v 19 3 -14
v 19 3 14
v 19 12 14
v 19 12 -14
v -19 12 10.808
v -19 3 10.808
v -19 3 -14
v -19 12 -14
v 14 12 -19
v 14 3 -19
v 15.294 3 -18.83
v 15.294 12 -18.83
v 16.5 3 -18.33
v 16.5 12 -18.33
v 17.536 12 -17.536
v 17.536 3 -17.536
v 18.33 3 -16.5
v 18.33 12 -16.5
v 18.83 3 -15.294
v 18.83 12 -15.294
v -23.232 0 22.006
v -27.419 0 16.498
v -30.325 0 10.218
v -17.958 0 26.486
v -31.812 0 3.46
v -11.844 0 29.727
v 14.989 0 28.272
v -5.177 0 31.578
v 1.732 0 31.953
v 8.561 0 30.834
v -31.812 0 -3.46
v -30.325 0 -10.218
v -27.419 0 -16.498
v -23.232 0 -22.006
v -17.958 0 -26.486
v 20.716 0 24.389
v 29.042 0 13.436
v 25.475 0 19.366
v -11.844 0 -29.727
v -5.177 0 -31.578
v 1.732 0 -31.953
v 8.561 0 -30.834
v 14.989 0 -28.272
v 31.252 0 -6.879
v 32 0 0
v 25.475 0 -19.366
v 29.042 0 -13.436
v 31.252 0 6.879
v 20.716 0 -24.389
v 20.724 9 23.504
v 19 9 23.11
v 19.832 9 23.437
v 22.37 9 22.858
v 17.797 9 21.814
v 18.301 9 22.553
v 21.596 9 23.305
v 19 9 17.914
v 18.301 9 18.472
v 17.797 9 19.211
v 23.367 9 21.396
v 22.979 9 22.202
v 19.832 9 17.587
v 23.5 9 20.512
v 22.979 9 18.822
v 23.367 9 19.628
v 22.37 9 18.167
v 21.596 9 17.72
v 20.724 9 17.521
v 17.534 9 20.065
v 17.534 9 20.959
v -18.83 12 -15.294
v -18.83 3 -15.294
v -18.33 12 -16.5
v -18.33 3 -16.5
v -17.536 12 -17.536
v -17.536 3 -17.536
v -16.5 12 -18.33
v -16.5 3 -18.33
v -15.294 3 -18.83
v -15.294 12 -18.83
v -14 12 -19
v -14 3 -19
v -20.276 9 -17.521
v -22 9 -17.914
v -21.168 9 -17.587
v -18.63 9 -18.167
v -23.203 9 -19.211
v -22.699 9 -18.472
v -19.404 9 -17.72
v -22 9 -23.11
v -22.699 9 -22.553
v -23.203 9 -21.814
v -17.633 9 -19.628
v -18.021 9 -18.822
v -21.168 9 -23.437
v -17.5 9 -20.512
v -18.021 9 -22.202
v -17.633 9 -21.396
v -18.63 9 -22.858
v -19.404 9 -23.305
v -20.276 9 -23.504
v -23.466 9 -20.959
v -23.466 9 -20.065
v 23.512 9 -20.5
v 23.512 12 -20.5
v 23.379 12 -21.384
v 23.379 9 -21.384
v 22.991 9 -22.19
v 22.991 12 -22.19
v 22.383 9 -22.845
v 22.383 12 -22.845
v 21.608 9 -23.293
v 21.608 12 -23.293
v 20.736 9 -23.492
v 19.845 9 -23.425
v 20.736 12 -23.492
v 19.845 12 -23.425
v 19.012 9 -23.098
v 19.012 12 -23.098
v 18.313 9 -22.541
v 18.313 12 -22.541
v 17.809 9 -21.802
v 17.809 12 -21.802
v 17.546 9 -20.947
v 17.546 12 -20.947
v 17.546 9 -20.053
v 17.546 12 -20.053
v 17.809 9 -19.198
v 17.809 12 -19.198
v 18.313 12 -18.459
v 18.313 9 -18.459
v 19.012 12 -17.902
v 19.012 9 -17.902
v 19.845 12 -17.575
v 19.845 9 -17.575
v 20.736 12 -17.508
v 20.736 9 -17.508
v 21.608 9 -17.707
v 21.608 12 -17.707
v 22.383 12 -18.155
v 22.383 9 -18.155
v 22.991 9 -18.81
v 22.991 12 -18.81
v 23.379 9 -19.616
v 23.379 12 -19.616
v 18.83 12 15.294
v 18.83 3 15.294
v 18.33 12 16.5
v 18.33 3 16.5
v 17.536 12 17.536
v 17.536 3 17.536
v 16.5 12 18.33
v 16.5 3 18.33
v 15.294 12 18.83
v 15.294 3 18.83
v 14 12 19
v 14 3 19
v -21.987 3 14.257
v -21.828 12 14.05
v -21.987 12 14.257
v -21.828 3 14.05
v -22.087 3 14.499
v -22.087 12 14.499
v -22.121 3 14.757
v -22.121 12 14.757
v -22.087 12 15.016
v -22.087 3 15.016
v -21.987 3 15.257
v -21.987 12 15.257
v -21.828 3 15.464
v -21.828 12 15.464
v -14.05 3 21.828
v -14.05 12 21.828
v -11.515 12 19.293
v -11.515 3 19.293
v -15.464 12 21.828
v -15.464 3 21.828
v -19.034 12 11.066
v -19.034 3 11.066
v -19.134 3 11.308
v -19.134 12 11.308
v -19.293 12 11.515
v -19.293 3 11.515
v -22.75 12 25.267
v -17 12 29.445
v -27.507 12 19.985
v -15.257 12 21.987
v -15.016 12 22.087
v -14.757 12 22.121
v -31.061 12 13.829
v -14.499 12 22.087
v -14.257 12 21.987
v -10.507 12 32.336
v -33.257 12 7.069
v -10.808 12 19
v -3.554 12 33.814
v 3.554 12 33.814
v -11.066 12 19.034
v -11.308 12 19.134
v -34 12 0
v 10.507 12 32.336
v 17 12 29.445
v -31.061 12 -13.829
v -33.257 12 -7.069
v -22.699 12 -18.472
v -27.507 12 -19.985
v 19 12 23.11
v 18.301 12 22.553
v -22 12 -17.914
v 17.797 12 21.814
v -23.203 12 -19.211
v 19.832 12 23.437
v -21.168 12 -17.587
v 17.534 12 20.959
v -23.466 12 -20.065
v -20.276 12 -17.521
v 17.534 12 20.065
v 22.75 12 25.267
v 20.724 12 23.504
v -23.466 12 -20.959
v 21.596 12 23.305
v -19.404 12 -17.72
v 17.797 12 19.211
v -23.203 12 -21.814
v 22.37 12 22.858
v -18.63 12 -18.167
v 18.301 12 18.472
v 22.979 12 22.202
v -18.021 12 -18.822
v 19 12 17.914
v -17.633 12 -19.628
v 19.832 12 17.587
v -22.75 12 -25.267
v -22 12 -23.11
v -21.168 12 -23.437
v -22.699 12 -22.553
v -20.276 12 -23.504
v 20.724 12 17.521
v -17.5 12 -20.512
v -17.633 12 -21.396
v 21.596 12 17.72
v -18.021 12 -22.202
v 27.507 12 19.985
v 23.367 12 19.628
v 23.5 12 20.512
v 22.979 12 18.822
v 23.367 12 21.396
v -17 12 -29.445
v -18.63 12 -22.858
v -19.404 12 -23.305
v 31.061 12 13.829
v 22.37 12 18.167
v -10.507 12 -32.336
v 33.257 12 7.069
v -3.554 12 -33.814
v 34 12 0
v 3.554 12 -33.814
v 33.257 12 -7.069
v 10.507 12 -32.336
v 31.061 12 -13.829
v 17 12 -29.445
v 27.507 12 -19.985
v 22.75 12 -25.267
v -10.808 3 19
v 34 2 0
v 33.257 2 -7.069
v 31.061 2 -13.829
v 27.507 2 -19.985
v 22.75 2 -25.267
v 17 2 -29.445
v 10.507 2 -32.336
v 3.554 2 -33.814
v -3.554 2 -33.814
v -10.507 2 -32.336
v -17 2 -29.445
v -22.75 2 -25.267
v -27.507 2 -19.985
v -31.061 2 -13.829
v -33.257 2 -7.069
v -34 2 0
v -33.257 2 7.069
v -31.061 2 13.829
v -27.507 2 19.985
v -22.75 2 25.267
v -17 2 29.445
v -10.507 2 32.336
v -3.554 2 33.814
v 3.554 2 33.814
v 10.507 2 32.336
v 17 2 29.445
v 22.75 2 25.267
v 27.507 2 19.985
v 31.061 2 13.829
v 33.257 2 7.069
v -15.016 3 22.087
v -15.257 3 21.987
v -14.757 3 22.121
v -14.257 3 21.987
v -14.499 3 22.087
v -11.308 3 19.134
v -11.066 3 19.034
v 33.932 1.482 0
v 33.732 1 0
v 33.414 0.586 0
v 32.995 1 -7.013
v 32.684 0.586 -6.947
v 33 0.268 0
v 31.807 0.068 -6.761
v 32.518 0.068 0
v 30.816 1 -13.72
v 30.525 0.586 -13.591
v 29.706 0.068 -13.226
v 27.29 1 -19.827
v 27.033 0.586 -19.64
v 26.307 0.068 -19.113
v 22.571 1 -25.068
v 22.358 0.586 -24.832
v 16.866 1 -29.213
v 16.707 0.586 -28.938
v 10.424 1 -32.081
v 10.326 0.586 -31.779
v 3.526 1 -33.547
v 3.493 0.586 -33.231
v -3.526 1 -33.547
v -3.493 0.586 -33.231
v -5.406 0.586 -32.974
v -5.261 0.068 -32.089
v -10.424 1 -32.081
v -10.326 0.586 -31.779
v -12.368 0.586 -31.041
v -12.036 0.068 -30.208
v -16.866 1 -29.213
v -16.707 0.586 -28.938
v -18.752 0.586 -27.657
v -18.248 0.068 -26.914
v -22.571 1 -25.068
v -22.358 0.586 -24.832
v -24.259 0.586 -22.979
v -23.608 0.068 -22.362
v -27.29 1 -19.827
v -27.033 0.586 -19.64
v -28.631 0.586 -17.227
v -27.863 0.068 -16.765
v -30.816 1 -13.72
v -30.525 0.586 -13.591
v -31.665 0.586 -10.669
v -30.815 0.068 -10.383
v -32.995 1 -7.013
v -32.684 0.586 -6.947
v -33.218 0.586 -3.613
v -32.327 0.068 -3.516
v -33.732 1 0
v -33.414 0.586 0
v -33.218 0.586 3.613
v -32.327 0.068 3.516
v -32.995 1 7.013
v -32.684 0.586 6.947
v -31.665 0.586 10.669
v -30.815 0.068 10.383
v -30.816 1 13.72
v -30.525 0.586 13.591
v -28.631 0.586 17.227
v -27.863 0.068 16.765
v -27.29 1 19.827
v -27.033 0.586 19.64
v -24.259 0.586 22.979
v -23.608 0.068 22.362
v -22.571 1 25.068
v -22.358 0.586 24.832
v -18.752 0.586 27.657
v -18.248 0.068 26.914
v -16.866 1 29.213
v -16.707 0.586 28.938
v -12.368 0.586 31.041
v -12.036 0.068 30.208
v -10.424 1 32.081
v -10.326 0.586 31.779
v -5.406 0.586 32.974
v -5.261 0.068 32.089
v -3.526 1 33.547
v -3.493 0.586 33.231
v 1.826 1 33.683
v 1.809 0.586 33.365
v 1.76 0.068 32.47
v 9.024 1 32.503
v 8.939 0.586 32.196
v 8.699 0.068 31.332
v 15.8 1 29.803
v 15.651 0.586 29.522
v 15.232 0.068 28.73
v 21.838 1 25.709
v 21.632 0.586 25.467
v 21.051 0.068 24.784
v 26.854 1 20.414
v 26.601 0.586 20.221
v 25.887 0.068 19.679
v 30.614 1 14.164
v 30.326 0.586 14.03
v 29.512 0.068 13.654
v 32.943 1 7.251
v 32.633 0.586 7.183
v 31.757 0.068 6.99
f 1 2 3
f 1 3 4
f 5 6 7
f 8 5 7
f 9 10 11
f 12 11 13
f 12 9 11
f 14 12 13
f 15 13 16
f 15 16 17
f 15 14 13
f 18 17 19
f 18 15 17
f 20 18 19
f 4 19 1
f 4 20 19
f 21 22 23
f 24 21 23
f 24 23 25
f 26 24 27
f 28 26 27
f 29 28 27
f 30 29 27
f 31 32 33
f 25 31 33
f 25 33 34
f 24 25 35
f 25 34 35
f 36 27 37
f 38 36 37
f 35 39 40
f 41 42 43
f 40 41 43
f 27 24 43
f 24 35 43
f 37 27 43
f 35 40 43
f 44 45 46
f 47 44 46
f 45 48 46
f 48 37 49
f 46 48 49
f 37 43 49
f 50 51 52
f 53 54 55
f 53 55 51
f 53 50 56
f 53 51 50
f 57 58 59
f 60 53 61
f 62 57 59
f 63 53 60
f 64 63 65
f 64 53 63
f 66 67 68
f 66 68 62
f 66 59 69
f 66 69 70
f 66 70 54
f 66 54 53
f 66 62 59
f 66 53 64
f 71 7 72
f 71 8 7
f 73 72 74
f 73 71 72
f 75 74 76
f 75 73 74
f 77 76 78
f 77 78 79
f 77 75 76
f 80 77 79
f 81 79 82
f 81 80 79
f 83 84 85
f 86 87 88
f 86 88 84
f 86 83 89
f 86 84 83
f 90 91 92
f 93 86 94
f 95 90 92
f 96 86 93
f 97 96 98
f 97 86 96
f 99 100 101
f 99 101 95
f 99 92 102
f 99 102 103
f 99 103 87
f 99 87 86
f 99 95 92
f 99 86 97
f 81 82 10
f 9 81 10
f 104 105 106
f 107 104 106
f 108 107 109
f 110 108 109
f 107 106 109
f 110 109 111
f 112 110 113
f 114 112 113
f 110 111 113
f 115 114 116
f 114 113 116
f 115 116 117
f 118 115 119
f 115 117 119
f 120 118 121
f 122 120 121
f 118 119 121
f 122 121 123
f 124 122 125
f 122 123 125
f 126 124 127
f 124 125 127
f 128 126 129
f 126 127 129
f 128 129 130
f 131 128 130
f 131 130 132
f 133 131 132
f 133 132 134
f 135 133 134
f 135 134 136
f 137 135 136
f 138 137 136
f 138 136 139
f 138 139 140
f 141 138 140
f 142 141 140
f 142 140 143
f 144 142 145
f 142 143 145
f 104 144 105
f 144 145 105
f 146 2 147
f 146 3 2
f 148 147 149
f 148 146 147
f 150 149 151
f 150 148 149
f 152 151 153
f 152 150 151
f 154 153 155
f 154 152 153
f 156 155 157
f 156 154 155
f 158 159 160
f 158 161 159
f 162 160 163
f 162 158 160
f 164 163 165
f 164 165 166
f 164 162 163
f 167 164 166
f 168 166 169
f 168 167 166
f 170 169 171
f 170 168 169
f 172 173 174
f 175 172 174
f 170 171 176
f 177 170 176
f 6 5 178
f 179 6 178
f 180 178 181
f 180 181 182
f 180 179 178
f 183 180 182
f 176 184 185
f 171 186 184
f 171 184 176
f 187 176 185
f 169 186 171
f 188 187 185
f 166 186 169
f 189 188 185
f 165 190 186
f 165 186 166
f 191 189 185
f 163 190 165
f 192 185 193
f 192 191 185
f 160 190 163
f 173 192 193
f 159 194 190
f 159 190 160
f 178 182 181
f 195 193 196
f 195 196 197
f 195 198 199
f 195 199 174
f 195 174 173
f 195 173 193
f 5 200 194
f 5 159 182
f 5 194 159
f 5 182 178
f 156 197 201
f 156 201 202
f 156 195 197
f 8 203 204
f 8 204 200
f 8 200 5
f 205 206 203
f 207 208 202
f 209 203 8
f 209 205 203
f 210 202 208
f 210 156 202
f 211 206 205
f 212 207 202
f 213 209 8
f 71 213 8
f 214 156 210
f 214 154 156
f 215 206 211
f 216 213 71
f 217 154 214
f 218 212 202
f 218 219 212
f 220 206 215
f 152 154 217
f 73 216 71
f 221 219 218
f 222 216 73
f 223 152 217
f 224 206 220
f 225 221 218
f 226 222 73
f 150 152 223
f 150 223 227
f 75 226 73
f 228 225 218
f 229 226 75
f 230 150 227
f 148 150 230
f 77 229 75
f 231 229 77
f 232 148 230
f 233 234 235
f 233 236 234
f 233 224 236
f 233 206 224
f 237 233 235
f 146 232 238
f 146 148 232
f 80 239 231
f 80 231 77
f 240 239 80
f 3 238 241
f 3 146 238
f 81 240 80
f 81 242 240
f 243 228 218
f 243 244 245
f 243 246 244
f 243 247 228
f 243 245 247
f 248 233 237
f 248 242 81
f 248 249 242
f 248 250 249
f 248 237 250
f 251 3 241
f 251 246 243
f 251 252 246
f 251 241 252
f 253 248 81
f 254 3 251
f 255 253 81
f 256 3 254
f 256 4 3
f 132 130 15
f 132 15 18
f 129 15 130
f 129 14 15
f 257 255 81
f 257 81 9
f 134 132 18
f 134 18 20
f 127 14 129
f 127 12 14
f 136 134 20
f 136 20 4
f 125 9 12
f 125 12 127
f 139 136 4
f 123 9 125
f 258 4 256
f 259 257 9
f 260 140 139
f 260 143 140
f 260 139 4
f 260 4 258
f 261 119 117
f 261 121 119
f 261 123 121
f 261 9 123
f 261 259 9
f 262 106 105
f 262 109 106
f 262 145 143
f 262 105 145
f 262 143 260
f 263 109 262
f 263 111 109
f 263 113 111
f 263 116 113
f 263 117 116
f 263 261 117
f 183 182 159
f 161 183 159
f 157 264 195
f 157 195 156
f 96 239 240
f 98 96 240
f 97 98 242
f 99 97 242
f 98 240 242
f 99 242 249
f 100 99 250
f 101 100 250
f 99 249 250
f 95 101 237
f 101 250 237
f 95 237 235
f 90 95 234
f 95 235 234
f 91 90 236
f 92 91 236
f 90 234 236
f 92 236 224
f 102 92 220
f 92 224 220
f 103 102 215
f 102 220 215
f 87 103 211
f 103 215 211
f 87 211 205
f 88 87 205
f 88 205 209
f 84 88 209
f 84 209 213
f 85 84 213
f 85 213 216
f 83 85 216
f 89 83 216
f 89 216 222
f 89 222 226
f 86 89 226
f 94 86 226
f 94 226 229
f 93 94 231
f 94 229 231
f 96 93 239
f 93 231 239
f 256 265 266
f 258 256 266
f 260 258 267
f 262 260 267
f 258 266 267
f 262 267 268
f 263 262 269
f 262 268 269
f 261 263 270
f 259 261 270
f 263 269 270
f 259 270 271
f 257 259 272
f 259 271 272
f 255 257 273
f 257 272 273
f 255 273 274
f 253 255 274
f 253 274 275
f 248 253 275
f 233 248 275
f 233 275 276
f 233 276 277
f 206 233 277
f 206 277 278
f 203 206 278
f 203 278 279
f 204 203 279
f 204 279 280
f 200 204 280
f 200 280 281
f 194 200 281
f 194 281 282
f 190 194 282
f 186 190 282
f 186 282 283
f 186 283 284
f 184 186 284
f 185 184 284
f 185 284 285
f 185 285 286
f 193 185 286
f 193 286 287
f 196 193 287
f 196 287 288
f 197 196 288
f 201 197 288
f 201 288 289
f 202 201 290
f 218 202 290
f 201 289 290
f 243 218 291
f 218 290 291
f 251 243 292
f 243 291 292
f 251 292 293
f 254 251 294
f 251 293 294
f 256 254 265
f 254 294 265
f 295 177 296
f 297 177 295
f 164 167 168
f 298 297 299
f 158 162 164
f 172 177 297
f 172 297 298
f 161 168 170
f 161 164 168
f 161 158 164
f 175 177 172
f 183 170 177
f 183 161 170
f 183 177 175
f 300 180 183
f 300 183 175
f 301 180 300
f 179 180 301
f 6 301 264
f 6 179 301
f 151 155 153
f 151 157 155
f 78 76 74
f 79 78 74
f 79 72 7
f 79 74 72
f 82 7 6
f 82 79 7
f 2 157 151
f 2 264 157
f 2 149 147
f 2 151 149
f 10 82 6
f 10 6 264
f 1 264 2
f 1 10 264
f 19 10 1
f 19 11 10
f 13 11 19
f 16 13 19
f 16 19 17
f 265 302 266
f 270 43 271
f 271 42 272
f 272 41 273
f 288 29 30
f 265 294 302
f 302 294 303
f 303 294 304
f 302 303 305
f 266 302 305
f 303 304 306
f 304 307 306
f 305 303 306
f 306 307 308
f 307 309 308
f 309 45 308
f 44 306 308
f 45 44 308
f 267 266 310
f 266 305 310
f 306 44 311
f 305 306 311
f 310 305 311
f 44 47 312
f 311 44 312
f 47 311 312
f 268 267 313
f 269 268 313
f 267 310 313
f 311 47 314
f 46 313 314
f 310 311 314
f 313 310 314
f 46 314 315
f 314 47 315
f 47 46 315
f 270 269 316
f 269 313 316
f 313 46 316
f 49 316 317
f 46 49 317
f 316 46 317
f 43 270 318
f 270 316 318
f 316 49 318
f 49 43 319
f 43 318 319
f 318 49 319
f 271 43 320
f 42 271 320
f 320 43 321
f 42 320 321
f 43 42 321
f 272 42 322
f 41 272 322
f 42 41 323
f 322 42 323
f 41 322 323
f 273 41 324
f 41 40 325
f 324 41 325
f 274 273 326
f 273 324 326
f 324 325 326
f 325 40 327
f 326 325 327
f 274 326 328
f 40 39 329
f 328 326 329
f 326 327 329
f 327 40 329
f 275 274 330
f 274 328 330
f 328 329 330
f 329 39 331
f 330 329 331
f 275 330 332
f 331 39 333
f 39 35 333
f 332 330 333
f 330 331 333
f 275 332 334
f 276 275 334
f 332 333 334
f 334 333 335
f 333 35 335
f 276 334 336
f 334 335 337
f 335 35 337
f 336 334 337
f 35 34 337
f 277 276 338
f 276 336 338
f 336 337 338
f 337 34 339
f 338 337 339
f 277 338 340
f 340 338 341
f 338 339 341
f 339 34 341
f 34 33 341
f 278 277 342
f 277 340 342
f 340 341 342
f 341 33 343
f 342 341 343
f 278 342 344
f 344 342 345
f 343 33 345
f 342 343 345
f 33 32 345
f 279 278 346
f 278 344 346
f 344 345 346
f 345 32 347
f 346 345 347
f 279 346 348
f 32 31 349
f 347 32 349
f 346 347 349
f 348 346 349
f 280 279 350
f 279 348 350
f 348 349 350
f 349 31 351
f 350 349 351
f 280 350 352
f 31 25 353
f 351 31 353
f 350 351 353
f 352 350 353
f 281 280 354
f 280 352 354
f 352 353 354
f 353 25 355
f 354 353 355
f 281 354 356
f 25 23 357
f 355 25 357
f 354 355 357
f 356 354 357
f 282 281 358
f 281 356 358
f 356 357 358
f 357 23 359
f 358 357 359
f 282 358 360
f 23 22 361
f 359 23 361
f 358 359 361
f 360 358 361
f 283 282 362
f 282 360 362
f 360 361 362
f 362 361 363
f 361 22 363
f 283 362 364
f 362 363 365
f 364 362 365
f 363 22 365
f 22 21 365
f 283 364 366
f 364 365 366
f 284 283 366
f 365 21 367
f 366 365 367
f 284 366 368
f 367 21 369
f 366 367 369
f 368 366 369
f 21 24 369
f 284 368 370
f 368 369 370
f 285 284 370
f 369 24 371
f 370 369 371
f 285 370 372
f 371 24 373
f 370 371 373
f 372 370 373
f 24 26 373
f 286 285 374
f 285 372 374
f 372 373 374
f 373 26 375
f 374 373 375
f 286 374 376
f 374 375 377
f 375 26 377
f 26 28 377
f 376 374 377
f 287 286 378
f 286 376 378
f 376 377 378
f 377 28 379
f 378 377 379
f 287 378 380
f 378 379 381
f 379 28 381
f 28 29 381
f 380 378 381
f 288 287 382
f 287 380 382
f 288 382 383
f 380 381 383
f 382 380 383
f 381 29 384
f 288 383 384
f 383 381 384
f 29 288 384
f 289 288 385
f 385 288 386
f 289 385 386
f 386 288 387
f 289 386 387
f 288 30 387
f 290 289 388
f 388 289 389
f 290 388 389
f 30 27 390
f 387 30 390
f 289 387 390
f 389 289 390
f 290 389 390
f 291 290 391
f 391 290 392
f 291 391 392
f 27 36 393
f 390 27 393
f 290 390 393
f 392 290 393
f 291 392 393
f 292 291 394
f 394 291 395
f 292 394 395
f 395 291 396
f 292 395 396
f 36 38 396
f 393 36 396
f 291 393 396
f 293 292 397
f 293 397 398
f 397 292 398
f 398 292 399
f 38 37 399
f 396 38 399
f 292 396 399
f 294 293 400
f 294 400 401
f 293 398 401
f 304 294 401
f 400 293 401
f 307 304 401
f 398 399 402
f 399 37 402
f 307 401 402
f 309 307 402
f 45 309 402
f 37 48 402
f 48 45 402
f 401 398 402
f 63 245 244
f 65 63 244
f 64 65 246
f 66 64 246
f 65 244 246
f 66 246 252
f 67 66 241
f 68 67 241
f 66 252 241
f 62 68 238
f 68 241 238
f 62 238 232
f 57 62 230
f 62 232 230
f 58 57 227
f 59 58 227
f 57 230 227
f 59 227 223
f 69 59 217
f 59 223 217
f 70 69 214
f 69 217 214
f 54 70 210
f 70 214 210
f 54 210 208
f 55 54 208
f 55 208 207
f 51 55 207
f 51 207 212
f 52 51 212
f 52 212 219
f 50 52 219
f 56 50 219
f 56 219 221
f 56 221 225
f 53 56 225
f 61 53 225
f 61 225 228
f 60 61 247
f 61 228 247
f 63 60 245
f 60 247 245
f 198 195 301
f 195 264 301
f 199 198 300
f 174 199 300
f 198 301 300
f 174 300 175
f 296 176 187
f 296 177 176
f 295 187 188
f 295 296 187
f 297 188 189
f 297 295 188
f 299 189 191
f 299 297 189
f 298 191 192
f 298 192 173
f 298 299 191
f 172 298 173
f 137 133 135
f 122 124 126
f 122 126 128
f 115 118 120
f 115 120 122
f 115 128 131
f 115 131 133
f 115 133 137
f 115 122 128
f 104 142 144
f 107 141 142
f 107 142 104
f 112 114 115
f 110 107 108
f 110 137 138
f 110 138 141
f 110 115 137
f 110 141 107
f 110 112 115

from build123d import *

# Parameters (mm, degrees)
SKETCH1_R           = 34
BOSS_EXTRUDE1_DEPTH = 3
SKETCH2_R           = 34
SKETCH2_W           = 38
SKETCH2_H           = 38
BOSS_EXTRUDE2_DEPTH = 9
FILLET1_R           = 5
SKETCH3_R           = 3
CUT_EXTRUDE1_DEPTH  = 3
CUT_EXTRUDE2_DEPTH  = 9
FILLET2_R           = 1
FILLET3_R           = 2


with BuildPart() as part:
    # Sketch1 → Boss-Extrude1 (new body)
    with BuildSketch(Plane(origin=(0, 0, 0), x_dir=(1, 0, 0), z_dir=(0, 1, 0))):
        Circle(SKETCH1_R)
    extrude(amount=BOSS_EXTRUDE1_DEPTH)

    # Sketch2 → Boss-Extrude2 (add)
    with BuildSketch(Plane(origin=(0, 3, 0), x_dir=(1, 0, 0), z_dir=(0, 1, 0))):
        Circle(SKETCH2_R)
        Rectangle(SKETCH2_W, SKETCH2_H, mode=Mode.SUBTRACT)
    extrude(amount=BOSS_EXTRUDE2_DEPTH)

    # Fillet1
    fillet1_edges = [part.edges().sort_by_distance(p)[0] for p in [
        (19, 7.5, -19),
        (-19, 7.5, -19),
        (-19, 7.5, 19),
        (19, 7.5, 19),
    ]]
    fillet(fillet1_edges, radius=FILLET1_R)

    # Sketch3 → Cut-Extrude1 (cut)
    with BuildSketch(Plane(origin=(0, 12, 0), x_dir=(1, 0, 0), z_dir=(0, 1, 0))):
        with Locations((-20.5, 20.512191497)):
            Circle(SKETCH3_R)
        with Locations((20.512191497, 20.5)):
            Circle(SKETCH3_R)
        with Locations((20.5, -20.512191497)):
            Circle(SKETCH3_R)
    extrude(amount=-CUT_EXTRUDE1_DEPTH, mode=Mode.SUBTRACT)

    # Sketch4 → Cut-Extrude2 (cut)
    with BuildSketch(Plane(origin=(0, 12, 0), x_dir=(1, 0, 0), z_dir=(0, 1, 0))):
        Polygon((-19, -11.221825407), (-22.535533906, -14.757359313), (-17.139357786, -20.153535433), (-14.757359313, -22.535533906), (-11.221825407, -19), align=None)
    extrude(amount=-CUT_EXTRUDE2_DEPTH, mode=Mode.SUBTRACT)

    # Fillet2
    fillet2_edges = [part.edges().sort_by_distance(p)[0] for p in [
        (-19, 7.5, 11.221825407),
        (-11.221825407, 7.5, 19),
        (-14.757359313, 7.5, 22.535533906),
        (-22.535533906, 7.5, 14.757359313),
    ]]
    fillet(fillet2_edges, radius=FILLET2_R)

    # Fillet3
    fillet3_edges = [part.edges().sort_by_distance(p)[0] for p in [
        (-34, 0, 0),
    ]]
    fillet(fillet3_edges, radius=FILLET3_R)


solid = part.part
